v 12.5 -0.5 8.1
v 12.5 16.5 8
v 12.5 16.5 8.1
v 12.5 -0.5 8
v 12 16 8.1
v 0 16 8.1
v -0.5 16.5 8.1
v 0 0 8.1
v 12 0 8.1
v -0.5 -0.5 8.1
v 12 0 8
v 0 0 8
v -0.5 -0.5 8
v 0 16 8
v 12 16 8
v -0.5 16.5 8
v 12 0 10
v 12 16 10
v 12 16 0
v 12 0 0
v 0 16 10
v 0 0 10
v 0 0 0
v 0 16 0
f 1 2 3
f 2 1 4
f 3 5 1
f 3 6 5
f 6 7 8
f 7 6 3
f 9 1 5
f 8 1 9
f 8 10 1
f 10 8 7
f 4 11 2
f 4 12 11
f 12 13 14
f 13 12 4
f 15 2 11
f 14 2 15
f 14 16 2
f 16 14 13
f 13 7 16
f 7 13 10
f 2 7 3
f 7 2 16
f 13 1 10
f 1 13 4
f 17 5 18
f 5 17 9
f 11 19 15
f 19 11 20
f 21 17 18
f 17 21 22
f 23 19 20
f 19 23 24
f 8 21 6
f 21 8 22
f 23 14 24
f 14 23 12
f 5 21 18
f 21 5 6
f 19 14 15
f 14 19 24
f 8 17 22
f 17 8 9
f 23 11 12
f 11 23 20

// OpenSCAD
w = 12;
d = 16;
h = 10;

translate([-0.5, -0.5, 8])
# cube([w+1, d+1, 0.1]);
cube([w, d, h]);
